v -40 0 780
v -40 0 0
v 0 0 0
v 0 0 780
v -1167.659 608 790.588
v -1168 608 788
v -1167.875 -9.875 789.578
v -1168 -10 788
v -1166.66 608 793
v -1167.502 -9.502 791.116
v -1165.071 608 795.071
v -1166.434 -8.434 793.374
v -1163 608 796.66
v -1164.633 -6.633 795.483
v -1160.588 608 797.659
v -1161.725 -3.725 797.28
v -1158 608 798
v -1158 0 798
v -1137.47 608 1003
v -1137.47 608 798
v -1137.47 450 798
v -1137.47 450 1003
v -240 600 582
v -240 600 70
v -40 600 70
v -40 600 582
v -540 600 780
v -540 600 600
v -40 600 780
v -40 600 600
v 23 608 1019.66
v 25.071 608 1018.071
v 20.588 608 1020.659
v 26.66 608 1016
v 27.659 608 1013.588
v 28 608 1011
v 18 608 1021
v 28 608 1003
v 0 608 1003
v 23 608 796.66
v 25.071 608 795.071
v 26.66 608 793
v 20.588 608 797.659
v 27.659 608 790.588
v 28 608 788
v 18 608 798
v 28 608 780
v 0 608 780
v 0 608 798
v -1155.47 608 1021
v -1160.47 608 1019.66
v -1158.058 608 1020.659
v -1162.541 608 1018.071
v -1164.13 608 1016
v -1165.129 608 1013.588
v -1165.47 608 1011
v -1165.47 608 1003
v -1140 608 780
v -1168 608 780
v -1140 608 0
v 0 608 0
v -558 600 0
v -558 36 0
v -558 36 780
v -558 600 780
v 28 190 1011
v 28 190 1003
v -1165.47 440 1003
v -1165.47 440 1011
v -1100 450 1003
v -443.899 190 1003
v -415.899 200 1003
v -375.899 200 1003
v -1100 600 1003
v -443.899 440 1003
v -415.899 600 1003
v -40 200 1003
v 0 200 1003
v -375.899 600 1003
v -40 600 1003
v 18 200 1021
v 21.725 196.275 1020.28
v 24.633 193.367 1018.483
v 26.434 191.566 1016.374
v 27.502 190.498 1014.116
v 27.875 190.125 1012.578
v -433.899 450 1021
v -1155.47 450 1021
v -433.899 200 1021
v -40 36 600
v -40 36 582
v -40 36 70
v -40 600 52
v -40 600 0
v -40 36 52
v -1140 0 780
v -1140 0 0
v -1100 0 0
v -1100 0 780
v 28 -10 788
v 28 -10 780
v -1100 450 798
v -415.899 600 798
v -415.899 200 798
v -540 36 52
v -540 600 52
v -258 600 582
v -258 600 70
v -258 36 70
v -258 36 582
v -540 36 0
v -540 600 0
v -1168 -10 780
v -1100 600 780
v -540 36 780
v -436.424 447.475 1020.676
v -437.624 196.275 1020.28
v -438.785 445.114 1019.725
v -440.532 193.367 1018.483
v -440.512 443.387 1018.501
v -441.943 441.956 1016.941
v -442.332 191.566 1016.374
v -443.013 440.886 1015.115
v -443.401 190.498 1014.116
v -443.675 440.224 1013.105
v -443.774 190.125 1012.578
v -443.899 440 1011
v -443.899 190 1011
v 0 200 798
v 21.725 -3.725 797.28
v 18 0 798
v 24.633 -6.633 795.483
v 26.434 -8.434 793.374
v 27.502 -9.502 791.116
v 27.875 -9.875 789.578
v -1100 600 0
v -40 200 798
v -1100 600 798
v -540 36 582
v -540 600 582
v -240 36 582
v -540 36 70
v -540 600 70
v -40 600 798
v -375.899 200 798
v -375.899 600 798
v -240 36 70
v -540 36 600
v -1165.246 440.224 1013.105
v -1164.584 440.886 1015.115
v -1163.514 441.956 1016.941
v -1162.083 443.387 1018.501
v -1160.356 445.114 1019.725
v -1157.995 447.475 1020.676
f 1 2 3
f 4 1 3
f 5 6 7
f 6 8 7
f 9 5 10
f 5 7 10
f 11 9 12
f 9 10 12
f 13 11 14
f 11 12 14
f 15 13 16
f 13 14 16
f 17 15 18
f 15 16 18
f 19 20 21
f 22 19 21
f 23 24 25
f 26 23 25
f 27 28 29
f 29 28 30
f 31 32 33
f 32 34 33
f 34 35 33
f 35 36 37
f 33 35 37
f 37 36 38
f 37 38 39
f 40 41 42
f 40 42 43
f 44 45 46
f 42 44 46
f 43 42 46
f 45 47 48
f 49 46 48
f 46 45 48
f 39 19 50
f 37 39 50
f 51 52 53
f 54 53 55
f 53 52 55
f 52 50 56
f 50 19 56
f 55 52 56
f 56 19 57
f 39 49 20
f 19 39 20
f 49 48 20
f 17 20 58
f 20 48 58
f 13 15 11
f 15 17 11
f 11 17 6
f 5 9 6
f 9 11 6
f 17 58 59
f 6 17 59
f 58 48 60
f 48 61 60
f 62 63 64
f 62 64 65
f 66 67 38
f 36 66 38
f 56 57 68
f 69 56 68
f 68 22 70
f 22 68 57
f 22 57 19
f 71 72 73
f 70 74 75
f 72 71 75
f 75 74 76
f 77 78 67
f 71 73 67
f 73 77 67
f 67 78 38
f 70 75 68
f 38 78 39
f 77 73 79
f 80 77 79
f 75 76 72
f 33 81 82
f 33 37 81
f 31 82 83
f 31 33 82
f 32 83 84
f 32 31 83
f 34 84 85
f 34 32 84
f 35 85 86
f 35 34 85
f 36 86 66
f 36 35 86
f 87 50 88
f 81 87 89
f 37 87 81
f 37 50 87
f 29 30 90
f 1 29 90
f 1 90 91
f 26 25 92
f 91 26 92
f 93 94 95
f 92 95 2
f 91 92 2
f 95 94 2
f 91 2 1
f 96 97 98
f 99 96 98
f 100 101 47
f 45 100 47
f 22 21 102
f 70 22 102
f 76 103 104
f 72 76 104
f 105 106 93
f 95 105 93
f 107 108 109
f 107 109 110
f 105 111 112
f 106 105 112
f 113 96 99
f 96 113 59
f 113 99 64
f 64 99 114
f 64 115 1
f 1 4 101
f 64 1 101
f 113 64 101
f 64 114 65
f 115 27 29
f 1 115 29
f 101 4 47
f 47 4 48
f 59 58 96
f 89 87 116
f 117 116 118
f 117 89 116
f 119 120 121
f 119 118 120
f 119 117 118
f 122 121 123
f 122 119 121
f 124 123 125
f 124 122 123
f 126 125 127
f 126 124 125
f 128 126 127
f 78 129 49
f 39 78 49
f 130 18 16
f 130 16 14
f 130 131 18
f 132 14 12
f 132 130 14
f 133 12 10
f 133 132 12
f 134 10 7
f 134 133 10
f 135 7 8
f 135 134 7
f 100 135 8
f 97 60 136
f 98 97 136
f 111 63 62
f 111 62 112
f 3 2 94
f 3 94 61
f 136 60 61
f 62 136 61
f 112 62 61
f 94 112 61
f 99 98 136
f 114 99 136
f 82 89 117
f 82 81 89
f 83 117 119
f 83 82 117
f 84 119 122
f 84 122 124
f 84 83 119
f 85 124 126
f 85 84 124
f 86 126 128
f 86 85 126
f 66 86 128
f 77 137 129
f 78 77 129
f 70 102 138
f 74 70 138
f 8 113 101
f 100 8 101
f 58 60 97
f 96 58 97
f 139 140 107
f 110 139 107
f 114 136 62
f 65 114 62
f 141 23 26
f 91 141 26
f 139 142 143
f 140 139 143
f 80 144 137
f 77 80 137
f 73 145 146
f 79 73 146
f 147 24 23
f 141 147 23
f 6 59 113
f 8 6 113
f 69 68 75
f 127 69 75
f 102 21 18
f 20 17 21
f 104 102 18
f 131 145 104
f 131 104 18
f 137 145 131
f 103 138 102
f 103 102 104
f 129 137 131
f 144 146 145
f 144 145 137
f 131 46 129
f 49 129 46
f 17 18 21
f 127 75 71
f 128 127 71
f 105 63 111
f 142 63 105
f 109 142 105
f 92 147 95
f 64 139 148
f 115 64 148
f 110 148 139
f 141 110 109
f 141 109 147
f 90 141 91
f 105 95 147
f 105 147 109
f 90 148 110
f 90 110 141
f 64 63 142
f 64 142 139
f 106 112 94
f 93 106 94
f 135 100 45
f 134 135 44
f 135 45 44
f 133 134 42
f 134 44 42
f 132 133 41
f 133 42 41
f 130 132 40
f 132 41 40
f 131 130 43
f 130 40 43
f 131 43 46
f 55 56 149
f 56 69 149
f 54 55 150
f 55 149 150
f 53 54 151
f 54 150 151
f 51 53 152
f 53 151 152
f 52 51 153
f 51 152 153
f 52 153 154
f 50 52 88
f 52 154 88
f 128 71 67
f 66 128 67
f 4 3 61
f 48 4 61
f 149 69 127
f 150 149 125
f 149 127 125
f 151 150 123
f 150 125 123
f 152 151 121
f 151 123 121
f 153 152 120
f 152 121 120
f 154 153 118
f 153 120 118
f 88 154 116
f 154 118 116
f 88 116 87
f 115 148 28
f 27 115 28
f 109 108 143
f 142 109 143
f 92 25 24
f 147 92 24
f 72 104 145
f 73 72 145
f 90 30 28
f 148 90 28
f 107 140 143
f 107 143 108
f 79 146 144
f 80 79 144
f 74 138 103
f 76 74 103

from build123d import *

# Parameters (mm, degrees)
F0_W      = 18
F0_H      = 564
F1_DEPTH  = 780
F2_W      = 18
F2_H      = 512
F3_DEPTH  = 564
F5_DEPTH  = 18
F6_R      = 10
F7_W      = 40
F7_H      = 250
F7_H_2    = 150
F8_DEPTH  = 205
F10_DEPTH = 18
F11_R     = 10


with BuildPart() as f1:
    # F0 (on Top) → F1 (new body)
    with BuildSketch(Plane.XY):
        Polygon((-40, 0), (0, 0), (0, 608), (-1140, 608), (-1140, 0), (-1100, 0), (-1100, 600), (-558, 600), (-540, 600), (-40, 600), align=None)
        with Locations((-549, 318)):
            Rectangle(F0_W, F0_H)
    extrude(amount=F1_DEPTH)

    # F2 (on face) → F3 (join)
    with BuildSketch(Plane.XZ.offset(-600)):
        Polygon((-540, 70), (-540, 52), (-40, 52), (-40, 70), (-240, 70), (-258, 70), align=None)
        with Locations((-249, 326)):
            Rectangle(F2_W, F2_H)
        Polygon((-540, 582), (-258, 582), (-240, 582), (-40, 582), (-40, 600), (-540, 600), align=None)
    extrude(amount=F3_DEPTH)

    # F4 (on face) → F5 (join)
    with BuildSketch(Plane.XY.offset(780)):
        Polygon((28, 608), (0, 608), (-1140, 608), (-1168, 608), (-1168, -10), (28, -10), align=None)
    extrude(amount=F5_DEPTH)

    # F6
    f6_edges = [f1.edges().sort_by_distance(p)[0] for p in [
        (-570, -10, 798),
        (-1168, 299, 798),
        (28, 299, 798),
    ]]
    fillet(f6_edges, radius=F6_R)

    # F7 (on face) → F8 (join)
    with BuildSketch(Plane.XY.offset(798)):
        Polygon((-1100, 600), (-1100, 608), (-1137.470126, 608), (-1137.470126, 450), (-1100, 450), align=None)
        with Locations((-395.89883, 325)):
            Rectangle(F7_W, F7_H)
        with Locations((-395.89883, 525)):
            Rectangle(F7_W, F7_H_2)
        Polygon((0, 450), (0, 608), (-40, 608), (-40, 600), (-40, 450), align=None)
        with Locations((-20, 325)):
            Rectangle(F7_W, F7_H)
        Polygon((-40, 600), (-40, 608), (-1100, 608), (-1100, 600), (-415.89883, 600), (-375.89883, 600), align=None)
    extrude(amount=F8_DEPTH)

    # F9 (on face) → F10 (join)
    with BuildSketch(Plane.XY.offset(1003)):
        Polygon((0, 608), (-1137.470126, 608), (-1165.470126, 608), (-1165.470126, 440), (-443.89883, 440), (-443.89883, 190), (28, 190), (28, 608), align=None)
    extrude(amount=F10_DEPTH)

    # F11
    f11_edges = [f1.edges().sort_by_distance(p)[0] for p in [
        (-1165.470126, 524, 1021),
        (-804.684478, 440, 1021),
        (-443.89883, 315, 1021),
        (-207.949415, 190, 1021),
        (28, 399, 1021),
    ]]
    fillet(f11_edges, radius=F11_R)


solid = f1.part
